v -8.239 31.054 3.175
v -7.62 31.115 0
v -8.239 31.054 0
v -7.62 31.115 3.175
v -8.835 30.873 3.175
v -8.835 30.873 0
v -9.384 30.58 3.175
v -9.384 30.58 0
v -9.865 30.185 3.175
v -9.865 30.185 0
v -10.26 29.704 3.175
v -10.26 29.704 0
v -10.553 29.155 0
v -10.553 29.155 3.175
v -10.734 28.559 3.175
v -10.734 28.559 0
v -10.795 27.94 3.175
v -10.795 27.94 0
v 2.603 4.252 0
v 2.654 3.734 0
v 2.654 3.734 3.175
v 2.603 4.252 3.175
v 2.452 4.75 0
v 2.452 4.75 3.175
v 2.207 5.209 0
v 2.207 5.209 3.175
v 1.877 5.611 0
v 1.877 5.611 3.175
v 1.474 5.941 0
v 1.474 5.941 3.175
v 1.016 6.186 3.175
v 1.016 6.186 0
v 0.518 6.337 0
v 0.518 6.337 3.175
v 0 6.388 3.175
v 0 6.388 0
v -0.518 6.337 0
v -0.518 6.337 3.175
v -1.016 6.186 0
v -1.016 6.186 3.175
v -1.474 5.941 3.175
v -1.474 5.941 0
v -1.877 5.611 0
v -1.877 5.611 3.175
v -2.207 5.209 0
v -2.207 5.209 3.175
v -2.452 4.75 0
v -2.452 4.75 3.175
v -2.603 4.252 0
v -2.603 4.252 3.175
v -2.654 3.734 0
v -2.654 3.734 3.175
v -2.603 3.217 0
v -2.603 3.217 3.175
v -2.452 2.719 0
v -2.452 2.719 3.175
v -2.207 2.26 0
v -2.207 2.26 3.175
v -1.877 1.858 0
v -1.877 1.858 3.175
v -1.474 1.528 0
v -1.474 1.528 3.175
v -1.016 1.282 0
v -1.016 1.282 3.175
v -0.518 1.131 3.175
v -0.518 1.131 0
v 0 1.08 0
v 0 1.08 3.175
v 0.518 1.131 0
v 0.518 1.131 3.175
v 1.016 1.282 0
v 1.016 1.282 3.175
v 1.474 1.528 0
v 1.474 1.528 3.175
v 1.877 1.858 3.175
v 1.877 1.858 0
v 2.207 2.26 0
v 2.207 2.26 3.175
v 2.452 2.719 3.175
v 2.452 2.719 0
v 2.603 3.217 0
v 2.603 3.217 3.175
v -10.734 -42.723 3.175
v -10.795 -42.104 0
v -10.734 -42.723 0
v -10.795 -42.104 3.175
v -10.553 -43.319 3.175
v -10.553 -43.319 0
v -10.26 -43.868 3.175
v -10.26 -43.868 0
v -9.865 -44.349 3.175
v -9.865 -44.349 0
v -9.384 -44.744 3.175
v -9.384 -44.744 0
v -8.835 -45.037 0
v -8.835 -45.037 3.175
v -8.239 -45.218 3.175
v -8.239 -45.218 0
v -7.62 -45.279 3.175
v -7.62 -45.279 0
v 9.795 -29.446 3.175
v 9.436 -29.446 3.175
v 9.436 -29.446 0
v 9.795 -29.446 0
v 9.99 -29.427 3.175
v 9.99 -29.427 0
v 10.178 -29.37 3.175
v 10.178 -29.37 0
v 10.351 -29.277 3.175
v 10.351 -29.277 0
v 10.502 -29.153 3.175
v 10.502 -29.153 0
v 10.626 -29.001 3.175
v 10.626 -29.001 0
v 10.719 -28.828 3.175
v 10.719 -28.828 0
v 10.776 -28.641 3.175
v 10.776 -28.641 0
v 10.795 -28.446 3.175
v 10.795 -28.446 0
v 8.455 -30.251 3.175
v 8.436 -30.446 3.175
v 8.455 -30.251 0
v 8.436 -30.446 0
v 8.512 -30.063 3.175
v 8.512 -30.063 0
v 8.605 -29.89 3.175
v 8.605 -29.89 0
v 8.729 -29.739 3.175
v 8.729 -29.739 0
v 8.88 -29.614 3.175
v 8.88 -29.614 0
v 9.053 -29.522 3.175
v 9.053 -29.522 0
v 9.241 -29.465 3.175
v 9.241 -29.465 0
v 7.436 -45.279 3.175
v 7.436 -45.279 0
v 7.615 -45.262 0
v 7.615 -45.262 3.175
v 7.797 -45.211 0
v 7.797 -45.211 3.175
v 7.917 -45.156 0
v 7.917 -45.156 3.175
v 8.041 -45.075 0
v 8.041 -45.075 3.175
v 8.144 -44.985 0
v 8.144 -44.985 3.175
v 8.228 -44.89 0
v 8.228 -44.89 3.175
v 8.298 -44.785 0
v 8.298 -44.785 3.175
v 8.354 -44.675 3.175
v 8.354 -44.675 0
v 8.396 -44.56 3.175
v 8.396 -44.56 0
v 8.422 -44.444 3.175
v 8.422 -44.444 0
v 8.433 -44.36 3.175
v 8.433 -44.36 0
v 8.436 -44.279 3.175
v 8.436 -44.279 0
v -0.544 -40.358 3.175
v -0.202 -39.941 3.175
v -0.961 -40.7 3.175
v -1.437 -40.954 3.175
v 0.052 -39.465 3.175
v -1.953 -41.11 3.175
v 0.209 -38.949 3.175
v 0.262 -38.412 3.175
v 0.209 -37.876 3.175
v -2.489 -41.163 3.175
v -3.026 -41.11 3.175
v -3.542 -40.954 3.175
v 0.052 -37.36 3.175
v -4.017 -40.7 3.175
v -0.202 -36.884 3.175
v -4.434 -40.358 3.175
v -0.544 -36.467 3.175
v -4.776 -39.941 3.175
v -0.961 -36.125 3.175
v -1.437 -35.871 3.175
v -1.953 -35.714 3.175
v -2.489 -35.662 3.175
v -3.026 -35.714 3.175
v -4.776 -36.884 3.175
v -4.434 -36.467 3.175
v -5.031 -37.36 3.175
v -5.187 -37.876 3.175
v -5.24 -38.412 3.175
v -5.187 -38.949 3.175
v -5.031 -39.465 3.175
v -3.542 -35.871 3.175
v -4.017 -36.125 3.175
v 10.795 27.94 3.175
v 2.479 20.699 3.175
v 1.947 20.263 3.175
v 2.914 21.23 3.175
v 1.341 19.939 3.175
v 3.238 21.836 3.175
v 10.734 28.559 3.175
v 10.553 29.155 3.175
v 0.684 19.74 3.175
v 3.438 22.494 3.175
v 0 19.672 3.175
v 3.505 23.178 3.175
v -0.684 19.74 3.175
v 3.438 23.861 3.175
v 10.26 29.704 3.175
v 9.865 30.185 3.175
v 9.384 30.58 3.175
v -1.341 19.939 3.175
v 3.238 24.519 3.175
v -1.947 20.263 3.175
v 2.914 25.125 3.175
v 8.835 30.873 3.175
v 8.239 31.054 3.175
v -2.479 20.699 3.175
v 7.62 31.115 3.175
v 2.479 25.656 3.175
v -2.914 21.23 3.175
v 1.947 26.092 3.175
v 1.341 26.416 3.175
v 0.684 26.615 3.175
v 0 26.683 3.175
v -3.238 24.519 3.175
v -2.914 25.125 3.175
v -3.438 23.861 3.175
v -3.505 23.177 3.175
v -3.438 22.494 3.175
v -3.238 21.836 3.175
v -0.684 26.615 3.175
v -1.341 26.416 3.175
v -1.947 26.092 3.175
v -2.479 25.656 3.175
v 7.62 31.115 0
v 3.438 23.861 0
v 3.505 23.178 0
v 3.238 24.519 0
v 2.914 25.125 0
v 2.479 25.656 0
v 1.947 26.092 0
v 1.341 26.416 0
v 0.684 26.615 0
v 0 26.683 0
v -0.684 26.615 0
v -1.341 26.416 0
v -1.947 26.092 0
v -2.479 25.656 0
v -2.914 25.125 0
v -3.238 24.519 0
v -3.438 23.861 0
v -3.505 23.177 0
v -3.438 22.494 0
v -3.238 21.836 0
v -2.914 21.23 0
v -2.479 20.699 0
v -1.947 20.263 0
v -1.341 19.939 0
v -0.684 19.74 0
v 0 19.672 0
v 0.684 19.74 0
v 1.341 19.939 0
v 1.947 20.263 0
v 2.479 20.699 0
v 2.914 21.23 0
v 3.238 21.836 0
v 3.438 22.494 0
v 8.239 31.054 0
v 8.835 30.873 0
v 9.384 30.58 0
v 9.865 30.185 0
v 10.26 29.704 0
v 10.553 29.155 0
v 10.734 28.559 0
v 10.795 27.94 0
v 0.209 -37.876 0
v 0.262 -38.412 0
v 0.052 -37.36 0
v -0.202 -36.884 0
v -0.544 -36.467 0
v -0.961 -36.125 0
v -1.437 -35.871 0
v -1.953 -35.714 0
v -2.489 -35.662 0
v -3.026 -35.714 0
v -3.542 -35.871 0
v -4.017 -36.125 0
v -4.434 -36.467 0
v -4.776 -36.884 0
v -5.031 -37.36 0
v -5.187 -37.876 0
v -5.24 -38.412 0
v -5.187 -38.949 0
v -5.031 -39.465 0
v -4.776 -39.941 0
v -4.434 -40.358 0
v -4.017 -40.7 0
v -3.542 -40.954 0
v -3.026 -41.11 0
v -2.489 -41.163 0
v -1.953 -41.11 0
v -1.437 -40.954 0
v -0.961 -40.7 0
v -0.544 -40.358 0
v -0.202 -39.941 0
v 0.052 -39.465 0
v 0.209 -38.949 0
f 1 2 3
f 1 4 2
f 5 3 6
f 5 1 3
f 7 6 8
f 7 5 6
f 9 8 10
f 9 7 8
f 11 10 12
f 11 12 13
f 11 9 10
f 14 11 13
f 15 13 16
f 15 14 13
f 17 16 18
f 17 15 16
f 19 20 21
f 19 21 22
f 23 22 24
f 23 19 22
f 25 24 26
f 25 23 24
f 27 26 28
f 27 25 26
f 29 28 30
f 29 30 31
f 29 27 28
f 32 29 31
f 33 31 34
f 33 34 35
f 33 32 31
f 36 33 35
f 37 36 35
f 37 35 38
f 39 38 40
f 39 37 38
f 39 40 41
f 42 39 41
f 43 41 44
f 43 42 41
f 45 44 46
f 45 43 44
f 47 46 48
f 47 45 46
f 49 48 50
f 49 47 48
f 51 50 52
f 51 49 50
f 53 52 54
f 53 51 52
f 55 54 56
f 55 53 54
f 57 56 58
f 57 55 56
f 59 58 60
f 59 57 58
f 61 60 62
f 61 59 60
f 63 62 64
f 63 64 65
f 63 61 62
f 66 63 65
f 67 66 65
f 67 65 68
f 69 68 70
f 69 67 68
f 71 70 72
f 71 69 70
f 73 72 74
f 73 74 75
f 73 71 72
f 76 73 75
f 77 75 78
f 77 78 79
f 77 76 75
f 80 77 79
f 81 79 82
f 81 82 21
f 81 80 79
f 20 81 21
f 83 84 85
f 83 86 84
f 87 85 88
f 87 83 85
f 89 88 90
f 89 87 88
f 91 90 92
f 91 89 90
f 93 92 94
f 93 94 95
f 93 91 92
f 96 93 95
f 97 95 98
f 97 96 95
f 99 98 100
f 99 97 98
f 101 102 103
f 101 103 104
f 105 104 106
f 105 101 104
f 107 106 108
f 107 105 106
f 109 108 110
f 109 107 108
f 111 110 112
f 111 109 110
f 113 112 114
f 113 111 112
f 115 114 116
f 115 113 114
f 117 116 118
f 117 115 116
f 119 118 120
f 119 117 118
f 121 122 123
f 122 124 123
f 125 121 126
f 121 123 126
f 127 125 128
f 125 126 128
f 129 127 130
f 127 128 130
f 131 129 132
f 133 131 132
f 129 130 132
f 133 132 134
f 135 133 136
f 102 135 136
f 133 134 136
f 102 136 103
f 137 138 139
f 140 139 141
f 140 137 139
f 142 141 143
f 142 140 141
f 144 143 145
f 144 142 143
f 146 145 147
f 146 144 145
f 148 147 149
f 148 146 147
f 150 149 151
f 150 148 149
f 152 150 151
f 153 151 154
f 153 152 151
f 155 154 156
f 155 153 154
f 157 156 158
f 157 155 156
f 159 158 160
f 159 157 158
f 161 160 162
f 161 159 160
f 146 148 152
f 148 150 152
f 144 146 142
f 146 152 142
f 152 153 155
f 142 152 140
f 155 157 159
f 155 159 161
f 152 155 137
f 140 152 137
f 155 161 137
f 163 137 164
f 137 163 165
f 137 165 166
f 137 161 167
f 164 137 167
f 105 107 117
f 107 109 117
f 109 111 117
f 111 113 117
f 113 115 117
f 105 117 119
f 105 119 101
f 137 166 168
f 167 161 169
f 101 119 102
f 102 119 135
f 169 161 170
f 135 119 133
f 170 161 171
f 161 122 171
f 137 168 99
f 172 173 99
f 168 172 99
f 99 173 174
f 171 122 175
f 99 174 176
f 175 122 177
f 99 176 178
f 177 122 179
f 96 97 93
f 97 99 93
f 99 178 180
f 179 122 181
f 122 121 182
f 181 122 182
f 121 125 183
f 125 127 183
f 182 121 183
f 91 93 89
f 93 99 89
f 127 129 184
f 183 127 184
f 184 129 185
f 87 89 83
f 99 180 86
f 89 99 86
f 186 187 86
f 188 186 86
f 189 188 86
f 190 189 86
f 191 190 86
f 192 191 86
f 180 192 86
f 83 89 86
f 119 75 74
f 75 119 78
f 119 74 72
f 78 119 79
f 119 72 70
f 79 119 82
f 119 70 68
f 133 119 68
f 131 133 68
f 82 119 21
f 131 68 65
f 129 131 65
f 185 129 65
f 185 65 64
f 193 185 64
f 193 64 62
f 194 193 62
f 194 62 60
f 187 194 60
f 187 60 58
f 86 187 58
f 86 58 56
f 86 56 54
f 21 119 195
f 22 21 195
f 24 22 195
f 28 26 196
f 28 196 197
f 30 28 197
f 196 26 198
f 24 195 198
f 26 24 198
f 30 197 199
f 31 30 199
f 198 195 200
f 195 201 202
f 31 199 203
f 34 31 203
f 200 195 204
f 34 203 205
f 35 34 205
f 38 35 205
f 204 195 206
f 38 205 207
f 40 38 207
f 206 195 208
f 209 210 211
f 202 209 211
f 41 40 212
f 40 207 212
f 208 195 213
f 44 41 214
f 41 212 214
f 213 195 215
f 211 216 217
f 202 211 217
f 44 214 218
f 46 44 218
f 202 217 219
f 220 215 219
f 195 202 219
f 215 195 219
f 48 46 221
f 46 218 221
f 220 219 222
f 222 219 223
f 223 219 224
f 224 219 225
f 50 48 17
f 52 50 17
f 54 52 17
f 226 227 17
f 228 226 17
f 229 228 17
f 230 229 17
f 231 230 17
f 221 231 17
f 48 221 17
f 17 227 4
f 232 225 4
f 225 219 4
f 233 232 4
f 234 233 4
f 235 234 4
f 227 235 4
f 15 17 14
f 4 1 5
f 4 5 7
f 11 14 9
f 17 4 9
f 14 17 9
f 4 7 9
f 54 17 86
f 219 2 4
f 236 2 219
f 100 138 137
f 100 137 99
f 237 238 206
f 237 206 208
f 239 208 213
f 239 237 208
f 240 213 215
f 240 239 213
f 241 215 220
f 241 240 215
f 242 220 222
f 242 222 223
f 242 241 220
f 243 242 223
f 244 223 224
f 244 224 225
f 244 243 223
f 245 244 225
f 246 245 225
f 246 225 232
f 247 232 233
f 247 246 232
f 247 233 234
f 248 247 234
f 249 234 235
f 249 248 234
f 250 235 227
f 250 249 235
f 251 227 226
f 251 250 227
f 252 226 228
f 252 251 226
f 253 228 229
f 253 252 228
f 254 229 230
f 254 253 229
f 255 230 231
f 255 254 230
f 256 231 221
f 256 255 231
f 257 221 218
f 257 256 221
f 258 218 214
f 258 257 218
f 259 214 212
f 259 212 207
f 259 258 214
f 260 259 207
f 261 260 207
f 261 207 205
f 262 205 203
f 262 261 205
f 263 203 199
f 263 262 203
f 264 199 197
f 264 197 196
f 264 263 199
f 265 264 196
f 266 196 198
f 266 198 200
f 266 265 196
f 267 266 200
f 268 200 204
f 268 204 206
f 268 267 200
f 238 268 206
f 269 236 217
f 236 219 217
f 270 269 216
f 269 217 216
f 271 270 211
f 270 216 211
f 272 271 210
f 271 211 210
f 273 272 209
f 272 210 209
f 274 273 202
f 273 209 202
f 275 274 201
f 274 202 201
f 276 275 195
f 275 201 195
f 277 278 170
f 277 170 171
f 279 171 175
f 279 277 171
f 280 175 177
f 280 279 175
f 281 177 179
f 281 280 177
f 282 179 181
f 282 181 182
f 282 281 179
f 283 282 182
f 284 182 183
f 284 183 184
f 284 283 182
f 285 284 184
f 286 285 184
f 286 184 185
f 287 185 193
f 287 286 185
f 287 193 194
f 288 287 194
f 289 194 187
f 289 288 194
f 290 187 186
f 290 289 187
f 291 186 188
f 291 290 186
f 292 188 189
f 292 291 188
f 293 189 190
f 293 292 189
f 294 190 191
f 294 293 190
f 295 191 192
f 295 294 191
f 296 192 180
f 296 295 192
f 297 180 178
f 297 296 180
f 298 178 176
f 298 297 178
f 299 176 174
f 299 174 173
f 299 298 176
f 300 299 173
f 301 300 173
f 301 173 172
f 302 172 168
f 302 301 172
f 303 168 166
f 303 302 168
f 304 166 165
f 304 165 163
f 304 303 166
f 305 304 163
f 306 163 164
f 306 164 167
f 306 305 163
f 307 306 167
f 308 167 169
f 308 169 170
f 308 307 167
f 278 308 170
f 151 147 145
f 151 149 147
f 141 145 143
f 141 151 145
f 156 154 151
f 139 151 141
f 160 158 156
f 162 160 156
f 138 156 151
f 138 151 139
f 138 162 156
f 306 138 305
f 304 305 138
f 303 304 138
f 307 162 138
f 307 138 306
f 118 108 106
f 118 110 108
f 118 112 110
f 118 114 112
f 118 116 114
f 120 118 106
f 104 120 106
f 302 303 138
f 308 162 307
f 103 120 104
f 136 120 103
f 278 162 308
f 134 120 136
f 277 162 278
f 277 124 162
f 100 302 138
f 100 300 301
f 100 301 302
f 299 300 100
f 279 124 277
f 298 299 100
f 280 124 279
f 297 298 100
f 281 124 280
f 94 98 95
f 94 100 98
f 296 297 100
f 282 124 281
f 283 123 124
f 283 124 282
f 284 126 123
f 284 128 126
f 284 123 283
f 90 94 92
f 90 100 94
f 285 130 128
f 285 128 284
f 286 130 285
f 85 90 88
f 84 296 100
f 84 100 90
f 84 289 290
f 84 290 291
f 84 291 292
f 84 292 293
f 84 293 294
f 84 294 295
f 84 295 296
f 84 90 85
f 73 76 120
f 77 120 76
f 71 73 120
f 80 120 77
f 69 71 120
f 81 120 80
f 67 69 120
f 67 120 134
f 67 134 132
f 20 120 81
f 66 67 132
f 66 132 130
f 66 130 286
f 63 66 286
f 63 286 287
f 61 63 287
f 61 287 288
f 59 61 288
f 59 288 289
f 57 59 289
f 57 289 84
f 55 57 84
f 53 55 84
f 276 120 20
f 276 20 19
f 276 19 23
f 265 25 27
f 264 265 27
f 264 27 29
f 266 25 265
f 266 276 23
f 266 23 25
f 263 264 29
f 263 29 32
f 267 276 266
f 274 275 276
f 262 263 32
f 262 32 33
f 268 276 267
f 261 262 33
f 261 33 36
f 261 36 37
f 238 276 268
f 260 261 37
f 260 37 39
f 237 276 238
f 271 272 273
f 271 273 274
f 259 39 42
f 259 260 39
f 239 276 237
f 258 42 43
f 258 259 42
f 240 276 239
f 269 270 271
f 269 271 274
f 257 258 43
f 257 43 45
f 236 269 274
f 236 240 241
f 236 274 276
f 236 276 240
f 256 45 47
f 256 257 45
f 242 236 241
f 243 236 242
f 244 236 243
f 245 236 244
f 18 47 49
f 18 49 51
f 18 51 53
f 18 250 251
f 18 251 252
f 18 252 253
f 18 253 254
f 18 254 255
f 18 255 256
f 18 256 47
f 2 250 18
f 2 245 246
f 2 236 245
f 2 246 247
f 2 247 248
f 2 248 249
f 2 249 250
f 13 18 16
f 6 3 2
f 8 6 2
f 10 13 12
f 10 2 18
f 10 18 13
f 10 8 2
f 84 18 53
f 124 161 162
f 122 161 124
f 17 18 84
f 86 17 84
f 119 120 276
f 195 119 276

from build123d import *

# Parameters (mm, degrees)
SKETCH1_R           = 3.5052
SKETCH1_R_2         = 2.75082
SKETCH1_R_3         = 2.654
BOSS_EXTRUDE1_DEPTH = 3.175
FILLET1_R           = 3.175
SKETCH3_W           = 2.54
SKETCH3_H           = 15.868015335
CUT_EXTRUDE2_DEPTH  = 47.655831395
FILLET2_R           = 1


with BuildPart() as part:
    # Sketch1 → Boss-Extrude1 (new body)
    with BuildSketch(Plane.XY):
        Polygon((-10.795, 31.115), (10.795, 31.115), (10.795, -31.115), (10.795, -45.278625787), (-10.795, -45.278625787), (-10.795, -31.115), align=None)
        with Locations((0, 23.1775)):
            Circle(SKETCH1_R, mode=Mode.SUBTRACT)
        with Locations((-2.4892, -38.41242)):
            Circle(SKETCH1_R_2, mode=Mode.SUBTRACT)
        with Locations((0, 3.734436212)):
            Circle(SKETCH1_R_3, mode=Mode.SUBTRACT)
    extrude(amount=BOSS_EXTRUDE1_DEPTH)

    # Fillet1
    fillet1_edges = [part.edges().sort_by_distance(p)[0] for p in [
        (10.795, -45.278625787, 1.5875),
        (-10.795, -45.278625787, 1.5875),
        (-10.795, 31.115, 1.5875),
        (10.795, 31.115, 1.5875),
    ]]
    fillet(fillet1_edges, radius=FILLET1_R)

    # Sketch3 → Cut-Extrude2 (cut, through all)
    with BuildSketch(Plane.XY.offset(3.175)):
        with Locations((9.706042249, -37.379761593)):
            Rectangle(SKETCH3_W, SKETCH3_H)
    extrude(amount=-CUT_EXTRUDE2_DEPTH, mode=Mode.SUBTRACT)

    # Fillet2
    fillet2_edges = [part.edges().sort_by_distance(p)[0] for p in [
        (10.795, -29.445753925, 1.5875),
        (8.436042249, -29.445753925, 1.5875),
        (8.436042249, -45.171964108, 1.5875),
    ]]
    fillet(fillet2_edges, radius=FILLET2_R)


solid = part.part
